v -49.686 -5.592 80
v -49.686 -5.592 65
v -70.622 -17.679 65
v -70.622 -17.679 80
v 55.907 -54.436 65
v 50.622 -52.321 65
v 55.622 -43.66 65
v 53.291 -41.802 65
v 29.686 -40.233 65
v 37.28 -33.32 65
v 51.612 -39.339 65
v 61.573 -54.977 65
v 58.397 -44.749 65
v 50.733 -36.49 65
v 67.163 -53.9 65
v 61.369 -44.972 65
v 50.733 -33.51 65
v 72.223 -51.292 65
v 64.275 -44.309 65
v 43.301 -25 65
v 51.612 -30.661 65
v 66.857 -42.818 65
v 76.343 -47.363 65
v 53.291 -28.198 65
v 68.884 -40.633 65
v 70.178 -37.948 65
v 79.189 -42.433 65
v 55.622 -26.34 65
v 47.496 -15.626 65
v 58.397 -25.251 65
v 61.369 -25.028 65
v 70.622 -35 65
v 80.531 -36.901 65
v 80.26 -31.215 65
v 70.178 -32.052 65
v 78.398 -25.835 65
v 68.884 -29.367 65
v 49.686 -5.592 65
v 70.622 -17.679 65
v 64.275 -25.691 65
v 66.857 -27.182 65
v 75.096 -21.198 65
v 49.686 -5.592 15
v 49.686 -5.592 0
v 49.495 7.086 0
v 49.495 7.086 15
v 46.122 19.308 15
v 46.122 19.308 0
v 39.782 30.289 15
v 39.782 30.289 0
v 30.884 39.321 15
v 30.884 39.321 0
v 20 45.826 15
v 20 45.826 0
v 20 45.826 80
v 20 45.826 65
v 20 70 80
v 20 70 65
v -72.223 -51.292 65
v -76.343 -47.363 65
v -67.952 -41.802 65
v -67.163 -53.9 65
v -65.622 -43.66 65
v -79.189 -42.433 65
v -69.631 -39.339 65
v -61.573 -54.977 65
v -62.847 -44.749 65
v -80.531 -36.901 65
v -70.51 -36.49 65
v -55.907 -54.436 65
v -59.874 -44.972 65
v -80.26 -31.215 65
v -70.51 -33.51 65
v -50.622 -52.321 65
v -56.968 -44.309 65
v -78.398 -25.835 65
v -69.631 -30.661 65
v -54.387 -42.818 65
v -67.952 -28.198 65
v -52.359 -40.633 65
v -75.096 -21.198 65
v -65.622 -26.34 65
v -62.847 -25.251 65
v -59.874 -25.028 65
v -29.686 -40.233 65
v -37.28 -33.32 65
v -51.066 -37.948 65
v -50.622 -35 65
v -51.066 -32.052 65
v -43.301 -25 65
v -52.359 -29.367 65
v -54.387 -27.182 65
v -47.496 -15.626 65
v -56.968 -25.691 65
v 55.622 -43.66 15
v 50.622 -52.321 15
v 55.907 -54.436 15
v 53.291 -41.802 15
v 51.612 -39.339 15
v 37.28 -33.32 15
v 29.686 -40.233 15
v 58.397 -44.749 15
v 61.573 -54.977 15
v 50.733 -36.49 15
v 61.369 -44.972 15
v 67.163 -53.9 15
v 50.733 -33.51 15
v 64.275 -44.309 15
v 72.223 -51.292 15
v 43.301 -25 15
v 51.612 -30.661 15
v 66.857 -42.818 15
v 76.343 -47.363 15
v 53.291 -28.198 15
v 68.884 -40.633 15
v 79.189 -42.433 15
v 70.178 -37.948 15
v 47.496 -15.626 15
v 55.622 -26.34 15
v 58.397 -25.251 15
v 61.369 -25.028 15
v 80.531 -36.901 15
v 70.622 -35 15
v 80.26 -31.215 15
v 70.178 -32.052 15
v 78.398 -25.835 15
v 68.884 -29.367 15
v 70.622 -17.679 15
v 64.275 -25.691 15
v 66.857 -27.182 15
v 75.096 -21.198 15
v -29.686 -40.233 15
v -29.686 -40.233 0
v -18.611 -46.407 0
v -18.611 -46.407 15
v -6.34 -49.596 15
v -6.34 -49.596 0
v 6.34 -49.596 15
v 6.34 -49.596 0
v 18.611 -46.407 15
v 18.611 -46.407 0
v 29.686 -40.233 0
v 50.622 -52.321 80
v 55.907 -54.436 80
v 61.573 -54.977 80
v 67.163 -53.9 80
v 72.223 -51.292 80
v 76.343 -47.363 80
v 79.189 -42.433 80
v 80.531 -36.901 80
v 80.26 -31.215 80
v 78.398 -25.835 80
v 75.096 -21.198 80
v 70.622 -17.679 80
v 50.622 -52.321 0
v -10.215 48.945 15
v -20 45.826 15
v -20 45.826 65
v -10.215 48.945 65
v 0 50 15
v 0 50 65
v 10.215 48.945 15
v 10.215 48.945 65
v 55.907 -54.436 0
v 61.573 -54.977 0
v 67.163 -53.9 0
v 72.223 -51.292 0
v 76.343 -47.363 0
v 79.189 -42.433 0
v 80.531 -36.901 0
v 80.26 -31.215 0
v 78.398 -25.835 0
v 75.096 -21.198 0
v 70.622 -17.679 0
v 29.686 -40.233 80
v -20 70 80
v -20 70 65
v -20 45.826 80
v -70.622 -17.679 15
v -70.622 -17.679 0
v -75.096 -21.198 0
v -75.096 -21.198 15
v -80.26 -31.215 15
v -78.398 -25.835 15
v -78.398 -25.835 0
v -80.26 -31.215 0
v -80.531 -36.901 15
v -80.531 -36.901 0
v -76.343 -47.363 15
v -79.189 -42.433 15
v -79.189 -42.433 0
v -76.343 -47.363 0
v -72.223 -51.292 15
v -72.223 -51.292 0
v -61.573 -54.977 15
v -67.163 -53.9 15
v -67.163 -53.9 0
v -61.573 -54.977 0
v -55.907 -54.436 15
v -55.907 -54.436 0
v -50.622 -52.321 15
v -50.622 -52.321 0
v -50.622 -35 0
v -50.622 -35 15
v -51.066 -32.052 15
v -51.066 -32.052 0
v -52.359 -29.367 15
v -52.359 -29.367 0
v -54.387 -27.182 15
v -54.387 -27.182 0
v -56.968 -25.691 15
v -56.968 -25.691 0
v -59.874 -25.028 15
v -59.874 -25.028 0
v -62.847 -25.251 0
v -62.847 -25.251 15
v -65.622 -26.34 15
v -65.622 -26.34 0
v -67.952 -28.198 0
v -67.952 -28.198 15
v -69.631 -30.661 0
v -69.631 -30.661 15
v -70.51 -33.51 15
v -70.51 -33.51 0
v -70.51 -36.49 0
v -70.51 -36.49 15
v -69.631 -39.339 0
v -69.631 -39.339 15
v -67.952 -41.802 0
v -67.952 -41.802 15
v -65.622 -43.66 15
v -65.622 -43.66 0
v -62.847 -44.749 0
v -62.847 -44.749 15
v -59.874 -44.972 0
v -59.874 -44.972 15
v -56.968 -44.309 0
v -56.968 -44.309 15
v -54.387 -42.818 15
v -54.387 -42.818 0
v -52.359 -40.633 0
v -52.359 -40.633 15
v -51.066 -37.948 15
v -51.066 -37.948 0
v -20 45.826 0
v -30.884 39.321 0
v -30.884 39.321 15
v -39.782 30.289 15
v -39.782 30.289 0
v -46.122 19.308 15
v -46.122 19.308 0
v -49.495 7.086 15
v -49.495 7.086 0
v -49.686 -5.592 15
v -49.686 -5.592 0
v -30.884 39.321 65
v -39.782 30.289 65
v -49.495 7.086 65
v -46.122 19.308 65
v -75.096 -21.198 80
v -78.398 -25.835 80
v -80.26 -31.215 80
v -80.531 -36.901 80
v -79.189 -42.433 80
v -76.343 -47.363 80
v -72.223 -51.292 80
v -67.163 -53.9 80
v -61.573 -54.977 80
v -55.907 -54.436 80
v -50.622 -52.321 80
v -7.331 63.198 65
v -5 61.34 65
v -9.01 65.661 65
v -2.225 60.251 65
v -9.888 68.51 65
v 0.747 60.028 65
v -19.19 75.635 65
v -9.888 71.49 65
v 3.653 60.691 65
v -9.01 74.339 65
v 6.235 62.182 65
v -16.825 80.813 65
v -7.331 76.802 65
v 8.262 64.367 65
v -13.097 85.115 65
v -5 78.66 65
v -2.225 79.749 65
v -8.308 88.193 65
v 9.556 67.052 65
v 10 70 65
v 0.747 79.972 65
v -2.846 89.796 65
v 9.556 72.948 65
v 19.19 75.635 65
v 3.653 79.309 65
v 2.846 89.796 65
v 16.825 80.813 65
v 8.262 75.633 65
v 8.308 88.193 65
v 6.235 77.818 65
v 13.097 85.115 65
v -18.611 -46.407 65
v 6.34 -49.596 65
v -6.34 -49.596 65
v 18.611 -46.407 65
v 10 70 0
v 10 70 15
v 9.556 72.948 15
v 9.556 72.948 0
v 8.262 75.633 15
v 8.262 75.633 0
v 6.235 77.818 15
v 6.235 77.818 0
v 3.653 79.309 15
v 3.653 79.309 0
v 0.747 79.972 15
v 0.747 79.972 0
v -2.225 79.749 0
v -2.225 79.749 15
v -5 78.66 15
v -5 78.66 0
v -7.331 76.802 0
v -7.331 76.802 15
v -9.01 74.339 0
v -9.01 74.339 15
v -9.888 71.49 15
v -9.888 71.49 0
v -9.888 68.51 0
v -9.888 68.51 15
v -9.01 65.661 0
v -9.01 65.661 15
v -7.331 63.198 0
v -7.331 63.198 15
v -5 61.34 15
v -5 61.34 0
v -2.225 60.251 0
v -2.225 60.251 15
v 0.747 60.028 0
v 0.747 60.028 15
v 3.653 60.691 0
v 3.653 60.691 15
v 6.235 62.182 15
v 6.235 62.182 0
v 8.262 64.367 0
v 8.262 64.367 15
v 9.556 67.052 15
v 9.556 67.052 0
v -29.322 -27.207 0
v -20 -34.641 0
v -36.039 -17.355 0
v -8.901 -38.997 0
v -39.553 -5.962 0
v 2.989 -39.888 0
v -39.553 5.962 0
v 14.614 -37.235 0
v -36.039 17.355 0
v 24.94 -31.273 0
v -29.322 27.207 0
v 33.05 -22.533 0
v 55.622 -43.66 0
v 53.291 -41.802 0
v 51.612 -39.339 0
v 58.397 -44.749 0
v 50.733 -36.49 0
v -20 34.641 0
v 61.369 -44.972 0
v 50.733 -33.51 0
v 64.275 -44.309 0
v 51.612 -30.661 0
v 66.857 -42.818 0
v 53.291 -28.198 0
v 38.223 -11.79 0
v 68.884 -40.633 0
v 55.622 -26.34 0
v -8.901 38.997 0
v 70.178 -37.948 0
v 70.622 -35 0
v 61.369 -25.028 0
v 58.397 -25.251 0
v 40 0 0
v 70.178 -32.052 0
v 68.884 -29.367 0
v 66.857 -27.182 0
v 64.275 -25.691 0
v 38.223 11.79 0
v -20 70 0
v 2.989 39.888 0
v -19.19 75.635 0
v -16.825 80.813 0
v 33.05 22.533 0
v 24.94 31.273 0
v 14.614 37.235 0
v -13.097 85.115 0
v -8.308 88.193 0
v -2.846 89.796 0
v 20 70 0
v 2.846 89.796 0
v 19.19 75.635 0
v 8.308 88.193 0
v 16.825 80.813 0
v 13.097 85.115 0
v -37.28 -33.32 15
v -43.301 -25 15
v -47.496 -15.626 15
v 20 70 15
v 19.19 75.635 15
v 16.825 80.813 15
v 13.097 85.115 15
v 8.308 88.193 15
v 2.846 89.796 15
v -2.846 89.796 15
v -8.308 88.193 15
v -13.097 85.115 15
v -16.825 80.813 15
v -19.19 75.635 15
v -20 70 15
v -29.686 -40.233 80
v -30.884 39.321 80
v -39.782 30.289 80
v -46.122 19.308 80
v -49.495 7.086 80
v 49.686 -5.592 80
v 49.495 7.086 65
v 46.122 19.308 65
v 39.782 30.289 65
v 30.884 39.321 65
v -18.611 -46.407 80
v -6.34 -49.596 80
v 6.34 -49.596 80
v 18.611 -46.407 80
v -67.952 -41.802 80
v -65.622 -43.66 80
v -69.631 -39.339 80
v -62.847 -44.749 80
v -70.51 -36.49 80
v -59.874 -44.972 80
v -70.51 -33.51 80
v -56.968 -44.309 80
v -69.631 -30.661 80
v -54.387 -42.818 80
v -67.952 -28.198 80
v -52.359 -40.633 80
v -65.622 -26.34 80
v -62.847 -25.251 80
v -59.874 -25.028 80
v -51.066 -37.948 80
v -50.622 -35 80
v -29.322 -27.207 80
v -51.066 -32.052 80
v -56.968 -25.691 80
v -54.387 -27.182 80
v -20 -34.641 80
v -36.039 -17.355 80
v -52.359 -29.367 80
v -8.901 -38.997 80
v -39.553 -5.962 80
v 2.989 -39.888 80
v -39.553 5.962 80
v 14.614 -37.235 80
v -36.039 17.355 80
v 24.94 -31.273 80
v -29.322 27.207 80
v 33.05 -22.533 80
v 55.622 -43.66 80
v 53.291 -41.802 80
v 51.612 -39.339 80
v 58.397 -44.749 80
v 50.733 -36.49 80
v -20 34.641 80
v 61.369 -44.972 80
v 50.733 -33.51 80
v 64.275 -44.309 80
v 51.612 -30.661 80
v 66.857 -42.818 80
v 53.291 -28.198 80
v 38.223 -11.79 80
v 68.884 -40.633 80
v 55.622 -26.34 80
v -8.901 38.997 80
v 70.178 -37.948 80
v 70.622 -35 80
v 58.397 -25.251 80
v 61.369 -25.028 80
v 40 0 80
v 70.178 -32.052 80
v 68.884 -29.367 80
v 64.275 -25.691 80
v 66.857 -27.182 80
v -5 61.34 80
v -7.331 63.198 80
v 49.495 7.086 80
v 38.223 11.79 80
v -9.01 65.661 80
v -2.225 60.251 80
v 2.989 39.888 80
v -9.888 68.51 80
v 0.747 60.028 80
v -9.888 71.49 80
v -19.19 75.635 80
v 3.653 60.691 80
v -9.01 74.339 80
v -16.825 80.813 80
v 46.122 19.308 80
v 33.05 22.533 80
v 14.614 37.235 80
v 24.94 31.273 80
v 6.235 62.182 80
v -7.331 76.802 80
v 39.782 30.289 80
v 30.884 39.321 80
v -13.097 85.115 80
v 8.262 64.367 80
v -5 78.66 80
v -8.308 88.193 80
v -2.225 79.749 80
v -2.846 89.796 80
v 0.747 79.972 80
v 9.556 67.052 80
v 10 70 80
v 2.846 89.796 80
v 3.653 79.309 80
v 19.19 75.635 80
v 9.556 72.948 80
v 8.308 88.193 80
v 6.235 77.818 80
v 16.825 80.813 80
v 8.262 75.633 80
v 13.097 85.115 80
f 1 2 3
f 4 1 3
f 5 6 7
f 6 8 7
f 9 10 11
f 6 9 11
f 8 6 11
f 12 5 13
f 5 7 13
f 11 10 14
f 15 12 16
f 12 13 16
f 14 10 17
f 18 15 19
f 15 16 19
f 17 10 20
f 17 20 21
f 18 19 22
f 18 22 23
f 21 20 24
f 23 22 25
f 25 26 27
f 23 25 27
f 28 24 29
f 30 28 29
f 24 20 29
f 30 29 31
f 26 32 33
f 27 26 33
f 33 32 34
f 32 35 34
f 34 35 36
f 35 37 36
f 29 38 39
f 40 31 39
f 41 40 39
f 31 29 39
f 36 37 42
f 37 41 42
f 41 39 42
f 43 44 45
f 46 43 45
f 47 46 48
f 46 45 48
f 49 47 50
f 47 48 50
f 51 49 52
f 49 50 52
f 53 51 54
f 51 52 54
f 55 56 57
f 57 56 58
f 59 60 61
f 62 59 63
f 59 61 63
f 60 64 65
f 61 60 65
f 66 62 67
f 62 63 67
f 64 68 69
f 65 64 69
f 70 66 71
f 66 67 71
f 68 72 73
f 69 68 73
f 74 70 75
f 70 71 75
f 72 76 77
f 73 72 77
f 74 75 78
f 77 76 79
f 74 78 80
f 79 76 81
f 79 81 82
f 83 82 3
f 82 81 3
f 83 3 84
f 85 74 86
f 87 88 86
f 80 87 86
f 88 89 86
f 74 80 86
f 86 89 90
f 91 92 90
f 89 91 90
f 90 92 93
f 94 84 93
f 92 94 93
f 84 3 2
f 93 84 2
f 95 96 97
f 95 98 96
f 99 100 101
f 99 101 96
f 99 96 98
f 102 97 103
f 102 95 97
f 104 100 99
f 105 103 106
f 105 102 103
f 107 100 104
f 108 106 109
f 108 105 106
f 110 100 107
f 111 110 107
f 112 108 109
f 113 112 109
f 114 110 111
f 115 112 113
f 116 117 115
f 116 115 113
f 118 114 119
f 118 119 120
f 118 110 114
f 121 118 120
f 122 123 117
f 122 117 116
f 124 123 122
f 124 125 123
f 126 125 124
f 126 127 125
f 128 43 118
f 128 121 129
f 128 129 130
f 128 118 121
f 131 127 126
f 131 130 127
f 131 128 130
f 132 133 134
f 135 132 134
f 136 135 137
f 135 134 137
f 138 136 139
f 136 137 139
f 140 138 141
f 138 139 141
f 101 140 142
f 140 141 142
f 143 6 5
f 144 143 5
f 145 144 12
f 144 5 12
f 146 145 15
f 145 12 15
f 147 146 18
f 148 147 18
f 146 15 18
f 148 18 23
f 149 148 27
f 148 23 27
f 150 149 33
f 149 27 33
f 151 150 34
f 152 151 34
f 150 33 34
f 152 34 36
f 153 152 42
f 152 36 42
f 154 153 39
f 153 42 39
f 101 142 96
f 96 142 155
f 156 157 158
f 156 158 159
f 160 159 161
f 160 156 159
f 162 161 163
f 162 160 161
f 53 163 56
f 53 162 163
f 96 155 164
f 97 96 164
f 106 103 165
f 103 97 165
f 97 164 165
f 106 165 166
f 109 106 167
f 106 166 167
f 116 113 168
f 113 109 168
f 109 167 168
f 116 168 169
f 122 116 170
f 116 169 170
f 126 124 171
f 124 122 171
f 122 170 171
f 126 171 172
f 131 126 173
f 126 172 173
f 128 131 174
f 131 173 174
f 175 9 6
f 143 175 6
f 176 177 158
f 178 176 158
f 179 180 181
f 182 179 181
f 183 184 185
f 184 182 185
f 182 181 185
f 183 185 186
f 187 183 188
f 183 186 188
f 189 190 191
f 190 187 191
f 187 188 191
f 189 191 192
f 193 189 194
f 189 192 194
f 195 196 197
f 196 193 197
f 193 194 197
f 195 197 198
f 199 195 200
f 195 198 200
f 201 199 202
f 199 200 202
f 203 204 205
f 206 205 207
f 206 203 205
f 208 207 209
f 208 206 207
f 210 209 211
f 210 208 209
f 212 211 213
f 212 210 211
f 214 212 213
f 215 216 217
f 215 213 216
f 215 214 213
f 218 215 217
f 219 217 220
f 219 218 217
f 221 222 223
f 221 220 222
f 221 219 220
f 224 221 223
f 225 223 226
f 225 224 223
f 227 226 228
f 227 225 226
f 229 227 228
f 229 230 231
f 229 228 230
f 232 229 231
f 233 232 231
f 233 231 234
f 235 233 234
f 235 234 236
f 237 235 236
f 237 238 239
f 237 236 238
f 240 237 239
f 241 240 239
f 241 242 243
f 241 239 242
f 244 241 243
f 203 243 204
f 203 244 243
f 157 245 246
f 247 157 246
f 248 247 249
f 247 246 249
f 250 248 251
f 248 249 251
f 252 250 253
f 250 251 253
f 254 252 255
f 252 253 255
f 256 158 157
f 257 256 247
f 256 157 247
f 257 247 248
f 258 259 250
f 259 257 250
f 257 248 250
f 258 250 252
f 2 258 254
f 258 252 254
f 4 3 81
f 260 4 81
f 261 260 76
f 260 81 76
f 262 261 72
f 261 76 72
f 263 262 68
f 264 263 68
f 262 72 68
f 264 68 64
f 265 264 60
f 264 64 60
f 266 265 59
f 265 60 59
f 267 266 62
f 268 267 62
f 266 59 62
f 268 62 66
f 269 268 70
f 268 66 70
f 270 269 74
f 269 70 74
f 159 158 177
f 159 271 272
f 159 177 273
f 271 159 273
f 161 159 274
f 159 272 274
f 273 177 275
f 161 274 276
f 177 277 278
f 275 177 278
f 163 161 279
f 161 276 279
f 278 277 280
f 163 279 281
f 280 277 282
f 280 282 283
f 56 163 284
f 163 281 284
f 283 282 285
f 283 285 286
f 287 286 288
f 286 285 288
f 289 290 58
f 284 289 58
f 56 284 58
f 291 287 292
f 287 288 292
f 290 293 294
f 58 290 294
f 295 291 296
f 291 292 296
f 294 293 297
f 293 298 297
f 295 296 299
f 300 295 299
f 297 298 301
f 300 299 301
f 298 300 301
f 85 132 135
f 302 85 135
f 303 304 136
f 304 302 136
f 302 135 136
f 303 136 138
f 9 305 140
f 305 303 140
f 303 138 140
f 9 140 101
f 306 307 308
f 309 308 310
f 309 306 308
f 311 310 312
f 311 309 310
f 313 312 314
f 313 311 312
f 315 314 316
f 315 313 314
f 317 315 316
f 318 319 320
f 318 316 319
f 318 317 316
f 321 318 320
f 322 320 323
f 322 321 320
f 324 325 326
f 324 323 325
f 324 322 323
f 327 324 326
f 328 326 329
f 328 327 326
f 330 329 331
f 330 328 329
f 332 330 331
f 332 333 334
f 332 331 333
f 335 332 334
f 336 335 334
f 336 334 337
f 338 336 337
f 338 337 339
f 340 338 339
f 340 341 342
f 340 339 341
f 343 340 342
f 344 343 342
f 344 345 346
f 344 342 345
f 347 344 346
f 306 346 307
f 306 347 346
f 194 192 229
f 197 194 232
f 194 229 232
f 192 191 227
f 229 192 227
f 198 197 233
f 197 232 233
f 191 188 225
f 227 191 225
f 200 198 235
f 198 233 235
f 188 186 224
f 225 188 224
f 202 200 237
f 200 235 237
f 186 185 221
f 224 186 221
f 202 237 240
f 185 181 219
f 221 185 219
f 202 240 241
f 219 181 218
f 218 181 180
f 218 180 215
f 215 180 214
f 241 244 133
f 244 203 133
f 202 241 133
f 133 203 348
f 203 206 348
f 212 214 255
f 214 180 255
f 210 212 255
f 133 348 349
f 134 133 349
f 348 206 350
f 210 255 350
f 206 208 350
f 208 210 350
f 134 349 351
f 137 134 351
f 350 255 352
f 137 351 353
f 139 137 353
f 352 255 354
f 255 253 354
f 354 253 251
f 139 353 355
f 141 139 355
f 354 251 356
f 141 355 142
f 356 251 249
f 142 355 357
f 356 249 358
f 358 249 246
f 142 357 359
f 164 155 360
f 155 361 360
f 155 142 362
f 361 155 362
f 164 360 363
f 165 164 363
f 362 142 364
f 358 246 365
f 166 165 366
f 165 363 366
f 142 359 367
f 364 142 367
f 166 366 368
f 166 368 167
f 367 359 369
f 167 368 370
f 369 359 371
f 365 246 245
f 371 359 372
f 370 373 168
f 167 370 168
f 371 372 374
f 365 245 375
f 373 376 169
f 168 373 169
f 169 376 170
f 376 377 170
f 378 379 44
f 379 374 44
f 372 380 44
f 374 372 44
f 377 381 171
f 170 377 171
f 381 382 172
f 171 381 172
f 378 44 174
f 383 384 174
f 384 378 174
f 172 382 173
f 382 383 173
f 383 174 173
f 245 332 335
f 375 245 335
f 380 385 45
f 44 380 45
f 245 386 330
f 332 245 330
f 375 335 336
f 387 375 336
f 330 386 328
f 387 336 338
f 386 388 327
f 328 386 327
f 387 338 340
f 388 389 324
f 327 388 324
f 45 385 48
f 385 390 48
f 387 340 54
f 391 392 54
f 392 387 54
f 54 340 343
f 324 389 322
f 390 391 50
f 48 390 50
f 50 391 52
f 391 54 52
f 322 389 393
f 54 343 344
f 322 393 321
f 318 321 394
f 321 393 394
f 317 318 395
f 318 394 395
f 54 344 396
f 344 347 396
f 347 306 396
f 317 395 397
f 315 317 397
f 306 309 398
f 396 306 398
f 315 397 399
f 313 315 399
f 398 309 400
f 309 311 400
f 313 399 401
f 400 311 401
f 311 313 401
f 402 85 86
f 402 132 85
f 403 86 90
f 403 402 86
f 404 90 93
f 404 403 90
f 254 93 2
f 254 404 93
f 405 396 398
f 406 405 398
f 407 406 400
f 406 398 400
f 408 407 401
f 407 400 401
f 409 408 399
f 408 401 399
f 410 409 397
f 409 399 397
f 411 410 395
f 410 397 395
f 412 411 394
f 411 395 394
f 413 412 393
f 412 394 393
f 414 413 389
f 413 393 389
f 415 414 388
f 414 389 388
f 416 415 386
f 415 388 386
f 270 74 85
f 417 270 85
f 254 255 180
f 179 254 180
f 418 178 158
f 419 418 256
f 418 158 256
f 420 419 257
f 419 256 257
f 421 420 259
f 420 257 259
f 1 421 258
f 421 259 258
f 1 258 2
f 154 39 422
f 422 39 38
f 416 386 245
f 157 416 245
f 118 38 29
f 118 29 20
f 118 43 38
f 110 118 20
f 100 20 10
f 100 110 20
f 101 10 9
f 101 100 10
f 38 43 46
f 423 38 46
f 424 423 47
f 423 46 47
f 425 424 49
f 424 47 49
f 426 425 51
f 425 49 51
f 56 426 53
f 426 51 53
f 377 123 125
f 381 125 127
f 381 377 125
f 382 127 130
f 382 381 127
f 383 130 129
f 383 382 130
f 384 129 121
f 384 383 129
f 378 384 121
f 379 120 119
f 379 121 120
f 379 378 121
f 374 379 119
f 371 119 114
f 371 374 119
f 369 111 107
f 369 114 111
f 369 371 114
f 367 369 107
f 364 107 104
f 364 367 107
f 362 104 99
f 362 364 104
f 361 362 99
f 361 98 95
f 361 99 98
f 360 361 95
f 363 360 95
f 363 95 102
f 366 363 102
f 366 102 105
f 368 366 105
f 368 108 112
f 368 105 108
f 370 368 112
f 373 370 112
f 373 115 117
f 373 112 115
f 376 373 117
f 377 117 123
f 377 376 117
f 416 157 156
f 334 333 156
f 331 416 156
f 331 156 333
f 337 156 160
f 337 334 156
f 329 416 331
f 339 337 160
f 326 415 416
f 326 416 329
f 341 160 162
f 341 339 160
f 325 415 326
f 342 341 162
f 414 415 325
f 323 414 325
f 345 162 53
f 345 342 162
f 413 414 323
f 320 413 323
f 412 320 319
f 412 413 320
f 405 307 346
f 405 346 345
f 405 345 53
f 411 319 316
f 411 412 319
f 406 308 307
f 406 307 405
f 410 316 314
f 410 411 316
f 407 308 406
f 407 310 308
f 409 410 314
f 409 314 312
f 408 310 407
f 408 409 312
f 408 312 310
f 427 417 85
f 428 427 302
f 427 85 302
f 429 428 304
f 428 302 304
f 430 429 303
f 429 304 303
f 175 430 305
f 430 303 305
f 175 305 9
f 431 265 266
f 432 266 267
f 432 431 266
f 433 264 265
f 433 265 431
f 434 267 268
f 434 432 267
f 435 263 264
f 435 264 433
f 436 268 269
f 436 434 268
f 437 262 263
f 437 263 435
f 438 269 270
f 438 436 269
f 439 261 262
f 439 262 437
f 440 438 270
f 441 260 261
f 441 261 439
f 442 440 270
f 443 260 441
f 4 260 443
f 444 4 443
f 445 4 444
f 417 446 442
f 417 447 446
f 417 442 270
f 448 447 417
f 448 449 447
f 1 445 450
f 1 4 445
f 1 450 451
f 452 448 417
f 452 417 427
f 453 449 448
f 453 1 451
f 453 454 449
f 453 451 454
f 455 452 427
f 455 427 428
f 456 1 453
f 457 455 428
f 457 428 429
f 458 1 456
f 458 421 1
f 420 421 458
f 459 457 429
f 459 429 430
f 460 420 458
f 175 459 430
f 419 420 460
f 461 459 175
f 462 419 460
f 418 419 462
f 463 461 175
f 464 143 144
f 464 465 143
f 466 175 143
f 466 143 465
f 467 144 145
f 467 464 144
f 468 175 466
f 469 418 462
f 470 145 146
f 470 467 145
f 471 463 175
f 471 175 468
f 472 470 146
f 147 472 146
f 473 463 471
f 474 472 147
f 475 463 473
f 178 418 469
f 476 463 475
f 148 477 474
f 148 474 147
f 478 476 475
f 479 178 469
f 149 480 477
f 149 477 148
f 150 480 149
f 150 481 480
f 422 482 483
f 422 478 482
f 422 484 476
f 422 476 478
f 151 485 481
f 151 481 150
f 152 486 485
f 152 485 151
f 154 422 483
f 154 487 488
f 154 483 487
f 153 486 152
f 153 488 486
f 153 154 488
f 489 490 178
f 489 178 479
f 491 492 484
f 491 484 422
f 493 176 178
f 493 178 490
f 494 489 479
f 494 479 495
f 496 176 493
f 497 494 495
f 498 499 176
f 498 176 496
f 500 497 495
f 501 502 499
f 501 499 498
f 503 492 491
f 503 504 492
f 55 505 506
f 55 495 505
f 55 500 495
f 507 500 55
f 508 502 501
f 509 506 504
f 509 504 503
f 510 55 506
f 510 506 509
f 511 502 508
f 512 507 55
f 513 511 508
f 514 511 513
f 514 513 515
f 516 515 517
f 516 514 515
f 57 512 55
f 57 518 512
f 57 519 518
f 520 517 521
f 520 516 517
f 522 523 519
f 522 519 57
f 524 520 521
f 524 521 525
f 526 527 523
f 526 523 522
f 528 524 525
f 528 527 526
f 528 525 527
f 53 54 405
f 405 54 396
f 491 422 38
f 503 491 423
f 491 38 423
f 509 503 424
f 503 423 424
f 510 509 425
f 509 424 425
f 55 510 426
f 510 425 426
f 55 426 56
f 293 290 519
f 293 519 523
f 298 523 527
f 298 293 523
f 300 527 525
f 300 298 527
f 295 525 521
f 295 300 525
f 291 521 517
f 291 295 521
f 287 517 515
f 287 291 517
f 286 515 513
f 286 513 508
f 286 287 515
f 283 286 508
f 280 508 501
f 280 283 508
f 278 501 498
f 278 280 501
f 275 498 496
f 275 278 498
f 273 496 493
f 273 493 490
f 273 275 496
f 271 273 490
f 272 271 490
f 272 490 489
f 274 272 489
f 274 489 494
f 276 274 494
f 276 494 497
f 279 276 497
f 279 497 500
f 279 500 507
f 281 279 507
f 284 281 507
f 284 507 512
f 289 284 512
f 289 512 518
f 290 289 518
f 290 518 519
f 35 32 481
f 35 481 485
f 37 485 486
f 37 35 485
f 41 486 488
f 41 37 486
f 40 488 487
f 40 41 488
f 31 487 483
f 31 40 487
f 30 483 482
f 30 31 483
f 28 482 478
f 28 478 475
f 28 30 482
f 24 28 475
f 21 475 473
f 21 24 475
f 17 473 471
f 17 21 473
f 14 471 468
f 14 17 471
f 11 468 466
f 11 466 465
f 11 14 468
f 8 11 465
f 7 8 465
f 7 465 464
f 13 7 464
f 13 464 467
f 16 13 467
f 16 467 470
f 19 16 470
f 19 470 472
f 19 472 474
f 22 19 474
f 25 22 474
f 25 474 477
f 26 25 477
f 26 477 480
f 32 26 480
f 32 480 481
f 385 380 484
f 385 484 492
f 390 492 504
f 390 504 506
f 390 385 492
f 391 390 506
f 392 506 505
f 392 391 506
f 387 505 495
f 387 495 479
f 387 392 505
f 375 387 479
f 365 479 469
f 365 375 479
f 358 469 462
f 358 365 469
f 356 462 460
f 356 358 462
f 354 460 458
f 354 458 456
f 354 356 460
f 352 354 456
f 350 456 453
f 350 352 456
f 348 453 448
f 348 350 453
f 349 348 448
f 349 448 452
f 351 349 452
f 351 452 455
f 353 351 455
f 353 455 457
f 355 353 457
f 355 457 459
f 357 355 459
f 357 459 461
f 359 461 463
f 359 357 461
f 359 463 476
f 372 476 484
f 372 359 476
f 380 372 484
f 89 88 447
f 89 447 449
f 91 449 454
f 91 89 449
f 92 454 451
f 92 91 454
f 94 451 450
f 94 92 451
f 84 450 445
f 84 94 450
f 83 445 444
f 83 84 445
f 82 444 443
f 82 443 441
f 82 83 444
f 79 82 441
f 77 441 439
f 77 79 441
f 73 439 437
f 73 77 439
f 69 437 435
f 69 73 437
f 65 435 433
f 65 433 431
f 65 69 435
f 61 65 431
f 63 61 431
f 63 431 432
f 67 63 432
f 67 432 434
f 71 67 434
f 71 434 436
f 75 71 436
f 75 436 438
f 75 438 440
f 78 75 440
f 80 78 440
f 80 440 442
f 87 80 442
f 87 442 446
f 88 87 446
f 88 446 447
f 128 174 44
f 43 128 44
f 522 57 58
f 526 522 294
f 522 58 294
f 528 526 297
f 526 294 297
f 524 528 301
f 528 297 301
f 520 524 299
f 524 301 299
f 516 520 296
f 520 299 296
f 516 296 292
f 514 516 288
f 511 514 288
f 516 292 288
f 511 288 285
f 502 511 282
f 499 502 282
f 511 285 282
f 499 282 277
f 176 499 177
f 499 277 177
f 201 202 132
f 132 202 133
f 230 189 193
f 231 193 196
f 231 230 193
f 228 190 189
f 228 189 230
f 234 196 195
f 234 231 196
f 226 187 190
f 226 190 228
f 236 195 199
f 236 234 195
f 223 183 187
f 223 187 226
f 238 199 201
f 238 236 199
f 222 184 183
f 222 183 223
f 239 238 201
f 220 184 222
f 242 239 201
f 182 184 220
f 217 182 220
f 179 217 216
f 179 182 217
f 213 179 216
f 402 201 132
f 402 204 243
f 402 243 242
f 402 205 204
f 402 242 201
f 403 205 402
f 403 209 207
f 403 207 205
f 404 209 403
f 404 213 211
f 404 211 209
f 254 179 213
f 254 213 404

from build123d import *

# Parameters (mm, degrees)
SKETCH1_R           = 50
SKETCH1_R_2         = 40
SKETCH1_R_3         = 10
BOSS_EXTRUDE1_DEPTH = 80
SKETCH6_W           = 60
SKETCH6_H           = 50


with BuildPart() as part:
    # Sketch1 → Boss-Extrude1 (new body)
    # profile 1 of 4: a face of its own
    with BuildSketch(Plane.XY):
        Circle(SKETCH1_R)
        Circle(SKETCH1_R_2, mode=Mode.SUBTRACT)
    # profile 2 of 4: a face of its own
    with BuildSketch(Plane.XY):
        with BuildLine():
            ThreePointArc((20, 70), (0, 90), (-20, 70))
            Line((-20, 70), (-20, 45.82575695))
            ThreePointArc((-20, 45.82575695), (0, 50), (20, 45.82575695))
            Line((20, 45.82575695), (20, 70))
        make_face()
        with Locations((0, 70)):
            Circle(SKETCH1_R_3, mode=Mode.SUBTRACT)
    # profile 3 of 4: a face of its own
    with BuildSketch(Plane.XY):
        with BuildLine():
            ThreePointArc((-29.686269666, -40.23338655), (-43.301270189, -25), (-49.686269666, -5.592370399))
            Line((-49.686269666, -5.592370399), (-70.621778265, -17.679491924))
            ThreePointArc((-70.621778265, -17.679491924), (-77.942286341, -45), (-50.621778265, -52.320508076))
            Line((-50.621778265, -52.320508076), (-29.686269666, -40.23338655))
        make_face()
        with Locations((-60.621778265, -35)):
            Circle(SKETCH1_R_3, mode=Mode.SUBTRACT)
    # profile 4 of 4: a face of its own
    with BuildSketch(Plane.XY):
        with BuildLine():
            Line((70.621778265, -17.679491924), (49.686269666, -5.592370399))
            ThreePointArc((49.686269666, -5.592370399), (43.301270189, -25), (29.686269666, -40.23338655))
            Line((29.686269666, -40.23338655), (50.621778265, -52.320508076))
            ThreePointArc((50.621778265, -52.320508076), (77.942286341, -45), (70.621778265, -17.679491924))
        make_face()
        with Locations((60.621778265, -35)):
            Circle(SKETCH1_R_3, mode=Mode.SUBTRACT)
    extrude(amount=BOSS_EXTRUDE1_DEPTH)

    # Sketch6 → Cut-Revolve1 (revolve, cut)
    with BuildSketch(Plane(origin=(0, 0, 0), x_dir=(-0.8660254037844385, -0.5000000000000004, 0), z_dir=(0.5000000000000003, -0.8660254037844384, 0)), mode=Mode.PRIVATE) as cut_revolve1_sk:
        with Locations((80, -40)):
            Rectangle(SKETCH6_W, SKETCH6_H)
    revolve(cut_revolve1_sk.sketch.rotate(Axis((0, 0, 80), (0, 0, -1)), 23.578178478), axis=Axis((0, 0, 80), (0, 0, -1)), mode=Mode.SUBTRACT)


solid = part.part
